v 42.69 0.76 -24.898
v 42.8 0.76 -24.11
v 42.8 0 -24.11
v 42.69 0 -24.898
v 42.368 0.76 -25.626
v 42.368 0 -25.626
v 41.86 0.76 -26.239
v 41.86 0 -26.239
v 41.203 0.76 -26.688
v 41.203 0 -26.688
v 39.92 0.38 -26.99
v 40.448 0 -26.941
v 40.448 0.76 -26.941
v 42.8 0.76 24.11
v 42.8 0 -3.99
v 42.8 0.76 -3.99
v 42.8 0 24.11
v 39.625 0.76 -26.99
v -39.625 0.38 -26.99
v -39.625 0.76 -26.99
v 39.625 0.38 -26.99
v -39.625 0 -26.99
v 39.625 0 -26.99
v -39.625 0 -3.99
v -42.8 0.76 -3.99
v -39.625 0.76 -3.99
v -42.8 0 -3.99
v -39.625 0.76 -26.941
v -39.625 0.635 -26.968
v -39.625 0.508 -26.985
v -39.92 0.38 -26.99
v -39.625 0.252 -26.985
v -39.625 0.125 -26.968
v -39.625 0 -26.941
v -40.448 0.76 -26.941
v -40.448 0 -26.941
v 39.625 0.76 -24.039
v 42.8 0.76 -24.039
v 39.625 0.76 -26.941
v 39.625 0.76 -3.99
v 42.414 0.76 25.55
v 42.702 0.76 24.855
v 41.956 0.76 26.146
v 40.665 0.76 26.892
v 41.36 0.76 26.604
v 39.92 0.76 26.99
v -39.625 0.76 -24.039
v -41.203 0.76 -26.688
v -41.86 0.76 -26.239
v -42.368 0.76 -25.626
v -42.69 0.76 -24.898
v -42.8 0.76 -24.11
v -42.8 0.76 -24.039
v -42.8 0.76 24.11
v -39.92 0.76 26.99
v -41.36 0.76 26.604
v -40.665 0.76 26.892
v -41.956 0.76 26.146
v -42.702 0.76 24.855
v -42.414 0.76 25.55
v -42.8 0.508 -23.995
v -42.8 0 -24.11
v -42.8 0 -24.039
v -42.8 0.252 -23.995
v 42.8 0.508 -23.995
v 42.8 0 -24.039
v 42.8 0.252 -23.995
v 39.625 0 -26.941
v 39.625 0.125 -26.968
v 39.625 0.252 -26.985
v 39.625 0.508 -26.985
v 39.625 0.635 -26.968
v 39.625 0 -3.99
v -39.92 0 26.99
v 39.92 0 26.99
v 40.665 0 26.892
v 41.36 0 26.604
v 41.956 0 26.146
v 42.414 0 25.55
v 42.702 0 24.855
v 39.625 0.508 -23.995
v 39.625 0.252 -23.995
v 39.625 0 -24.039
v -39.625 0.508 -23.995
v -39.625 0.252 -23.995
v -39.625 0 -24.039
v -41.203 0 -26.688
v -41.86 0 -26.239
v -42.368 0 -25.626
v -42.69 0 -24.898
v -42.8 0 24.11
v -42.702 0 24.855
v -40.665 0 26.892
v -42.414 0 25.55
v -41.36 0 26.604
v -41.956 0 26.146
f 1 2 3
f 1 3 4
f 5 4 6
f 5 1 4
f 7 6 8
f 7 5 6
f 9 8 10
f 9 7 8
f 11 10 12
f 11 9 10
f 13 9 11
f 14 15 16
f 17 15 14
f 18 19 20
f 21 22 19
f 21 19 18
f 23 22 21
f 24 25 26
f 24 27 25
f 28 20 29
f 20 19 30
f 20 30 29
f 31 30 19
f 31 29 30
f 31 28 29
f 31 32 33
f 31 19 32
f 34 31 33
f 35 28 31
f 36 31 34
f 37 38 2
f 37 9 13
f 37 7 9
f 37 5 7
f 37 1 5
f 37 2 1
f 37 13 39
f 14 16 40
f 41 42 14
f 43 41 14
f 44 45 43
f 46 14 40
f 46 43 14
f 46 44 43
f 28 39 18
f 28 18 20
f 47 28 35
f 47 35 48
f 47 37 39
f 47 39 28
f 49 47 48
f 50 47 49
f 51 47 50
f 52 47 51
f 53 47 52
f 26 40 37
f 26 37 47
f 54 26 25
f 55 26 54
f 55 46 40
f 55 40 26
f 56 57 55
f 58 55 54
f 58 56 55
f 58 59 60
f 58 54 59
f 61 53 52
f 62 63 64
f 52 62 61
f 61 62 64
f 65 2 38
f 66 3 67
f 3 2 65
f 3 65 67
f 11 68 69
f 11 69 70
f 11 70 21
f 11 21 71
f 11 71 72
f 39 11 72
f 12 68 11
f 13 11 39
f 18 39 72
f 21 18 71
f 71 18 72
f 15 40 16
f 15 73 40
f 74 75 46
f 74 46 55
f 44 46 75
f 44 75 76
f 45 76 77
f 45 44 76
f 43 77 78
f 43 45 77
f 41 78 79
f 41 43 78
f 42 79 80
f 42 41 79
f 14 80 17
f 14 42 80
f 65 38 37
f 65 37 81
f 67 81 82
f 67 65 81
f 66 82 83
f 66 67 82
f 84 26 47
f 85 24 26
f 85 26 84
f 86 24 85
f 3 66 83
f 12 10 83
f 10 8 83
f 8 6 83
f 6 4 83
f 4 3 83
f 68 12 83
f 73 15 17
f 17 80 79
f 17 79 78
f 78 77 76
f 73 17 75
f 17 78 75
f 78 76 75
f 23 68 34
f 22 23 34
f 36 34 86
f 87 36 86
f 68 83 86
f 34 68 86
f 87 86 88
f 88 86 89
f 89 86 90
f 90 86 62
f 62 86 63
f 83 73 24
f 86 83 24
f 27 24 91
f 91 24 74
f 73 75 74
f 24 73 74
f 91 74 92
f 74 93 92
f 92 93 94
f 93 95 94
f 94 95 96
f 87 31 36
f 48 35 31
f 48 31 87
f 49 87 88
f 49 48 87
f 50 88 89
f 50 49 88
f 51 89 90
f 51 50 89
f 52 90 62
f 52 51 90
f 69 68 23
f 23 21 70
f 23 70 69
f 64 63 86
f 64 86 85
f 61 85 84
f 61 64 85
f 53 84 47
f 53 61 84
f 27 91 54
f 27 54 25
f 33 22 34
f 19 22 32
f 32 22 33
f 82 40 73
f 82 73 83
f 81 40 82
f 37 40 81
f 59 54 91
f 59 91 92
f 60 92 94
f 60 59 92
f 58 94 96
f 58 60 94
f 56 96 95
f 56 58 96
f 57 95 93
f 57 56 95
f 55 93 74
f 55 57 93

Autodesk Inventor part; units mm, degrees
ref_plane "YZ Plane" through (0, 0, 0) normal (1, 0, 0) x (0, 1, 0)
ref_plane "XZ Plane" through (0, 0, 0) normal (0, 1, 0) x (-1, 0, 0)
ref_plane "XY Plane" through (0, 0, 0) normal (0, 0, 1) x (1, 0, 0)
sketch "Sketch1" plane through (0, 0, 0) normal (0, 1, 0) x (-1, 0, 0)
  line L0 (42.8, -26.99) -> (-42.8, -26.99)
  line L1 (-42.8, -26.99) -> (-42.8, 26.99)
  line L2 (-42.8, 26.99) -> (42.8, 26.99)
  line L3 (42.8, 26.99) -> (42.8, -26.99)
  line L4 (42.8, -26.99) -> (-42.8, 26.99) construction
  line L5 (-42.8, -26.99) -> (42.8, 26.99) construction
  point P0 (0, 0)
  dimension "d0" = 85.6
  dimension "d1" = 53.98
extrude "Extrusion1" add sketch "Sketch1" along normal blind 0.76
fillet "Fillet1" radius 2.88 4 edges at (42.8, 0.38, 26.99) (42.8, 0.38, -26.99) (-42.8, 0.38, 26.99) (-42.8, 0.38, -26.99)
sketch "Sketch2" plane through (0, 0, 0) normal (0, -1, 0) x (1, 0, 0)
  arc A0 (-42.8, -24.11) -> (-39.92, -26.99) centre (-39.92, -24.11) ccw projected
  line L0 (-39.92, -26.99) -> (39.92, -26.99) projected
  arc A1 (39.92, -26.99) -> (42.8, -24.11) centre (39.92, -24.11) ccw projected
  line L1 (42.8, -24.11) -> (42.8, 24.11) projected
  arc A2 (42.8, 24.11) -> (39.92, 26.99) centre (39.92, 24.11) ccw projected
  line L2 (39.92, 26.99) -> (-39.92, 26.99) projected
  arc A3 (-39.92, 26.99) -> (-42.8, 24.11) centre (-39.92, 24.11) ccw projected
  line L3 (-42.8, 24.11) -> (-42.8, -24.11) projected
  line L4 (-42.8, 24.11) -> (-42.8, -24.11) projected
  line L5 (-42.8, -3.99) -> (-39.625, -3.99)
  line L6 (-39.625, -3.99) -> (-39.625, -23.99)
  line L7 (-39.625, -23.99) -> (-42.8, -23.99)
  line L8 (-42.8, -23.99) -> (-42.8, -3.99)
  line L9 (42.8, 24.11) -> (42.8, -24.11) projected
  line L10 (42.8, -23.99) -> (39.625, -23.99)
  line L11 (39.625, -23.99) -> (39.625, -3.99)
  line L12 (39.625, -3.99) -> (42.8, -3.99)
  line L13 (42.8, -3.99) -> (42.8, -23.99)
  point P0 (0, 0)
  dimension "d5" = 3.175
  dimension "d6" = 3.175
  dimension "d7" = 3
  dimension "d8" = 3
  dimension "d9" = 20
  dimension "d10" = 20
extrude "Extrusion2" cut sketch "Sketch2" against normal through all contours L3 L5 L6 L7 | L10 L11 L12 L1
sketch "Sketch3" plane through (42.8, 0, 24.11) normal (1, 0, 0) x (0, 0, -1)
  line L0 (51.1, 0) -> (51.1, 0.76) projected
  line L1 (51.1, 0) -> (51.1, 0.76)
  line L2 (48.1, 0.76) -> (48.1, 0)
  line L3 (48.1, 0) -> (51.1, 0.76) construction
  line L4 (51.1, 0) -> (48.1, 0.76) construction
  line L5 (51.1, 0) -> (48.22, 0) projected
  arc A0 (48.1489, 0.76) -> (48.1489, 0) centre (49.6, 0.38) ccw
  arc A1 (51.0511, 0) -> (51.0511, 0.76) centre (49.6, 0.38) ccw
  line L6 (48.1, 0) -> (48.1489, 0)
  line L7 (51.0511, 0) -> (51.1, 0)
  line L8 (51.1, 0.76) -> (51.0511, 0.76)
  line L9 (48.1489, 0.76) -> (48.1, 0.76)
  point P0 (24.11, 0)
  point P1 (48.1, 0.38)
  point P2 (51.1, 0.38)
  dimension "d14" = 3
  dimension "d15" = 0.76
  dimension "d16" = 1.5
  dimension "d17" = 1.5
  dimension "d18" = 1.5
extrude "Extrusion3" cut sketch "Sketch3" against normal up to surface (3.175 mm away)
mirror "Mirror1" about plane through (0, 0, 0) normal (1, 0, 0) of "Extrusion3"
sketch "Sketch4" plane through (0, 0, 0) normal (0, -1, 0) x (1, 0, 0)
  line L0 (-39.625, -24.0389) -> (-42.8, -24.0389) projected
  line L1 (-42.8, -24.0389) -> (-42.8, -24.11) projected
  arc A0 (-42.8, -24.11) -> (-40.4486, -26.9411) centre (-39.92, -24.11) ccw projected
  line L2 (-40.4486, -26.9411) -> (-39.625, -26.9411) projected
  line L3 (-39.625, -26.9411) -> (-39.625, -26.99) projected
  line L4 (-39.625, -26.99) -> (39.625, -26.99) projected
  line L5 (39.625, -26.99) -> (39.625, -26.9411) projected
  line L6 (39.625, -26.9411) -> (40.4486, -26.9411) projected
  arc A1 (40.4486, -26.9411) -> (42.8, -24.11) centre (39.92, -24.11) ccw projected
  line L7 (42.8, -24.11) -> (42.8, -24.0389) projected
  line L8 (42.8, -24.0389) -> (39.625, -24.0389) projected
  line L9 (39.625, -24.0389) -> (39.625, -3.99) projected
  line L10 (39.625, -3.99) -> (42.8, -3.99) projected
  line L11 (42.8, -3.99) -> (42.8, 24.11) projected
  arc A2 (42.8, 24.11) -> (39.92, 26.99) centre (39.92, 24.11) ccw projected
  line L12 (39.92, 26.99) -> (-39.92, 26.99) projected
  arc A3 (-39.92, 26.99) -> (-42.8, 24.11) centre (-39.92, 24.11) ccw projected
  line L13 (-42.8, 24.11) -> (-42.8, -3.99) projected
  line L14 (-42.8, -3.99) -> (-39.625, -3.99) projected
  line L15 (-39.625, -3.99) -> (-39.625, -24.0389) projected
  line L16 (39.92, 26.99) -> (-39.92, 26.99) projected
  line L17 (42.8, -3.99) -> (42.8, 24.11) projected
  line L18 (-42.8, 24.11) -> (-42.8, -3.99) projected
  line L19 (-42.8, 26.99) -> (42.8, 26.99) construction
  line L20 (42.8, 26.99) -> (42.8, -27.0263) construction
  line L21 (42.8, -27.0263) -> (-42.8, -27.0263) construction
  line L22 (-42.8, -27.0263) -> (-42.8, 26.99) construction
  point P0 (0, 0)
decal "Decal1"
sketch "Sketch5" plane through (0, 0.76, 0) normal (0, 1, 0) x (1, 0, 0)
  line L0 (-42.8, 24.0389) -> (-39.625, 24.0389) projected
  line L1 (-39.625, 24.0389) -> (-39.625, 3.99) projected
  line L2 (-39.625, 3.99) -> (-42.8, 3.99) projected
  line L3 (-42.8, 3.99) -> (-42.8, -24.11) projected
  arc A0 (-42.8, -24.11) -> (-39.92, -26.99) centre (-39.92, -24.11) ccw projected
  line L4 (-39.92, -26.99) -> (39.92, -26.99) projected
  arc A1 (39.92, -26.99) -> (42.8, -24.11) centre (39.92, -24.11) ccw projected
  line L5 (42.8, -24.11) -> (42.8, 3.99) projected
  line L6 (42.8, 3.99) -> (39.625, 3.99) projected
  line L7 (39.625, 3.99) -> (39.625, 24.0389) projected
  line L8 (39.625, 24.0389) -> (42.8, 24.0389) projected
  line L9 (42.8, 24.0389) -> (42.8, 24.11) projected
  arc A2 (42.8, 24.11) -> (40.4486, 26.9411) centre (39.92, 24.11) ccw projected
  line L10 (40.4486, 26.9411) -> (39.625, 26.9411) projected
  line L11 (39.625, 26.9411) -> (39.625, 26.99) projected
  line L12 (39.625, 26.99) -> (-39.625, 26.99) projected
  line L13 (-39.625, 26.99) -> (-39.625, 26.9411) projected
  line L14 (-39.625, 26.9411) -> (-40.4486, 26.9411) projected
  arc A3 (-40.4486, 26.9411) -> (-42.8, 24.11) centre (-39.92, 24.11) ccw projected
  line L15 (-42.8, 24.11) -> (-42.8, 24.0389) projected
  line L16 (-42.8, 3.99) -> (-42.8, -24.11) projected
  line L17 (-42.8, 27.0263) -> (42.8, 27.0263) construction
  line L18 (42.8, 27.0263) -> (42.8, -26.99) construction
  line L19 (42.8, -26.99) -> (-42.8, -26.99) construction
  line L20 (-42.8, -26.99) -> (-42.8, 27.0263) construction
  line L21 (42.8, -24.11) -> (42.8, 3.99) projected
  point P0 (0, 0)
decal "Decal2"
equation "\"d0\" = cardWidth"
equation "\"d1\" = cardHeight"
equation "\"d2\" = cardThickness"
equation "\"d4\" = cardFillet"
equation "\"d5\" = materialThickness"
equation "\"d6\" = materialThickness"
equation "\"d7\" = cardPinDiameter"
equation "\"d8\" = cardPinDiameter"
equation "\"d9\" = cardCutoutHeight"
equation "\"d10\" = cardCutoutHeight"
equation "\"d11\" = cardThickness"
equation "\"d14\" = cardPinDiameter"
equation "\"d15\" = cardThickness"
equation "\"d16\" = 0.5 * cardPinDiameter"
equation "\"d18\" = 0.5 * cardPinDiameter"
equation "\"d19\" = cardThickness"
equation "\"materialThickness\" = 3.175"
equation "\"laserKerf\" = 0.12"
equation "\"cardPinDiameter\" = 3"
equation "\"centeralShaftDiameter\" = 8"
equation "\"cardWidth\" = 85.6"
equation "\"cardHeight\" = 53.98"
equation "\"cardThickness\" = 0.76"
equation "\"cardFillet\" = 2.88"
equation "\"cardCutoutHeight\" = 20"
equation "\"d13\" = cardPinDiameter"
equation "\"cardSelected\" = 1"
equation "\"cardClearence\" = 0.5"
equation "\"bearingOd\" = 22"
equation "\"bearingWidth\" = 8"
equation "\"axleHeight\" = 95"
equation "\"nutTrapDepth\" = 2.5"
equation "\"nutTrapwidth\" = 5.5"
equation "\"nutTrapClearence\" = 2"
equation "\"magnetLength\" = 3"
equation "\"magnetDiameter\" = 6"
equation "\"magnetProtusion\" = 0.25"
equation "\"spoolThickness\" = 5.588"
properties part number "card-01" material "ABS Plastic"
